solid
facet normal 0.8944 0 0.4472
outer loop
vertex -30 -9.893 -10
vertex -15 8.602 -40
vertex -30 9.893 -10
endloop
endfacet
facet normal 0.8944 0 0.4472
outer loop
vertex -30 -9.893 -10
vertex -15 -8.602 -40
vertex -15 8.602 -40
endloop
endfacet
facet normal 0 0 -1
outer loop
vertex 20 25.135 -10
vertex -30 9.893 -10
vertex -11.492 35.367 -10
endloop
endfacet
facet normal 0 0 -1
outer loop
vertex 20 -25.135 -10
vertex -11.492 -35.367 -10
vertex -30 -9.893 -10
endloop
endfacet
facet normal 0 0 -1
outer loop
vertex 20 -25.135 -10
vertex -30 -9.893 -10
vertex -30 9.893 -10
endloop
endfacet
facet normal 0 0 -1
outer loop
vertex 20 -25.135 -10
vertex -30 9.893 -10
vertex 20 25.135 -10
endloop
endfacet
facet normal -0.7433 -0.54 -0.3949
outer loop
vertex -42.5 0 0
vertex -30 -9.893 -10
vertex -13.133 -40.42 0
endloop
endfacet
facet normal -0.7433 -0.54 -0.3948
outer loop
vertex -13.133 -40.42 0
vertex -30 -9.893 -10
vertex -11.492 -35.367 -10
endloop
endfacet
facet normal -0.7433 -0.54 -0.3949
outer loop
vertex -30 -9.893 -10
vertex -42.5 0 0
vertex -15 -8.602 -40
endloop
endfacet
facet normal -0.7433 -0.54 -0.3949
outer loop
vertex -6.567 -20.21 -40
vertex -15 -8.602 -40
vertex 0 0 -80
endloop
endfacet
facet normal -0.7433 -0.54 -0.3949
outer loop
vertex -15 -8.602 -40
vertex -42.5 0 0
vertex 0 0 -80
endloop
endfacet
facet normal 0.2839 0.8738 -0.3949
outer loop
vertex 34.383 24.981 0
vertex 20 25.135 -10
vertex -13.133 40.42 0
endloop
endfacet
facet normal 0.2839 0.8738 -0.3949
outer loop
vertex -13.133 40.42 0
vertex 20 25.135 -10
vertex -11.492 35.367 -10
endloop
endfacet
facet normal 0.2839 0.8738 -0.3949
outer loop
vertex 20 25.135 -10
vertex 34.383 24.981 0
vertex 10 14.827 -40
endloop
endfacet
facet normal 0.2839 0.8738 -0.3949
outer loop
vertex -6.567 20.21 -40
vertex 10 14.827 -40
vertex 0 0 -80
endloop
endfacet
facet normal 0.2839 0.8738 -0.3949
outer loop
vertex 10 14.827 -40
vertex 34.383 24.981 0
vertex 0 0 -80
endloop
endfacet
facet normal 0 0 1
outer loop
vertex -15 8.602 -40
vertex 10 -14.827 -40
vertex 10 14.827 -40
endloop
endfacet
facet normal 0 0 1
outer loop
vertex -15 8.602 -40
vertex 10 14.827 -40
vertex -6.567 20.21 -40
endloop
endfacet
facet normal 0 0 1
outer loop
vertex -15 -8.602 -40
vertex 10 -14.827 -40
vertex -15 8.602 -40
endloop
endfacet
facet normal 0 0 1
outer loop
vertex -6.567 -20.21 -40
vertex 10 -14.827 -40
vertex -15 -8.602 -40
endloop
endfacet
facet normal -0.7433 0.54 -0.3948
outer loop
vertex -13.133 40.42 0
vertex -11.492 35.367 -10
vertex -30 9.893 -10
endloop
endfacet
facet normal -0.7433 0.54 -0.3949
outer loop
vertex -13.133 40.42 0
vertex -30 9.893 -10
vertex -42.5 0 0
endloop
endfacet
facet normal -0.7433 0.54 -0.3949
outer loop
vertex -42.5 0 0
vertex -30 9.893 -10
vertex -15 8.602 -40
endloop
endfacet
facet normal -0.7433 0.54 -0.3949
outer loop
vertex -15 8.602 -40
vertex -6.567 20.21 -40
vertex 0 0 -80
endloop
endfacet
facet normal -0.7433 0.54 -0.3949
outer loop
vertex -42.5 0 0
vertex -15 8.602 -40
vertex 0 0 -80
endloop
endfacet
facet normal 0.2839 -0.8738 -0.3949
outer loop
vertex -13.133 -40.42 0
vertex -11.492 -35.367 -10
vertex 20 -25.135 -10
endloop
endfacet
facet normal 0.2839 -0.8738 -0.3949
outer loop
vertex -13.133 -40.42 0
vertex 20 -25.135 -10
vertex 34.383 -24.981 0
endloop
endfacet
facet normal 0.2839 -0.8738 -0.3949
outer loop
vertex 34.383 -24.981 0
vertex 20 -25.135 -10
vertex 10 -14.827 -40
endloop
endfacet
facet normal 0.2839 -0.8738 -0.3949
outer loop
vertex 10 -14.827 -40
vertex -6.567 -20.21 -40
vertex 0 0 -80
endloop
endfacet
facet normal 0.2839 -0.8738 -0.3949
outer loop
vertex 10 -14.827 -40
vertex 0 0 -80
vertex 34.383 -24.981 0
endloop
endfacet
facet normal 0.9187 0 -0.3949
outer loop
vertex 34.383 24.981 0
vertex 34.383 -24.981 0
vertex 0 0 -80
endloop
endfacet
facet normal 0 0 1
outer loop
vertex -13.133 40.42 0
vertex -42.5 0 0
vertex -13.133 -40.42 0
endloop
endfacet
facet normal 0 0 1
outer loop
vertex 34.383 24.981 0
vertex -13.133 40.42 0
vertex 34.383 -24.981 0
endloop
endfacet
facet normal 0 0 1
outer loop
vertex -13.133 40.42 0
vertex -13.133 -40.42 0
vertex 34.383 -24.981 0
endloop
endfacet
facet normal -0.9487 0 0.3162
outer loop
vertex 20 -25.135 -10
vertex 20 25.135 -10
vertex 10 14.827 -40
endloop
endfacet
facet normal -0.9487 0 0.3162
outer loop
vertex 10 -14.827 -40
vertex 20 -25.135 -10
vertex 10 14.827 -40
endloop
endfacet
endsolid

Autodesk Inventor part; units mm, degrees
ref_plane "YZ Plane" through (0, 0, 0) normal (1, 0, 0) x (0, 1, 0)
ref_plane "XZ Plane" through (0, 0, 0) normal (0, 1, 0) x (-1, 0, 0)
sketch "Эскиз1" plane through (0, 0, 0) normal (0, 0, 1) x (1, 0, 0)
  line L0 (-42.5, 0) -> (-13.1332, 40.4199)
  line L1 (-13.1332, 40.4199) -> (34.3832, 24.9809)
  line L2 (34.3832, 24.9809) -> (34.3832, -24.9809)
  line L3 (34.3832, -24.9809) -> (-13.1332, -40.4199)
  line L4 (-13.1332, -40.4199) -> (-42.5, 0)
  point P0 (0, 0)
  point P1 (0, 0)
sketch "Эскиз2" plane through (0, 0, 0) normal (0, 1, 0) x (-1, 0, 0)
  line L0 (30, -10) -> (-20, -10)
  line L1 (-20, -10) -> (-10, -40)
  line L2 (-10, -40) -> (15, -40)
  line L3 (15, -40) -> (30, -10)
  line L4 (13.1332, 0) -> (-34.3832, 0) projected
  line L5 (42.5, 0) -> (13.1332, 0) projected
  point P0 (0, 0)
  dimension "d1" = 10
  dimension "d2" = 30
  dimension "d3" = 10
  dimension "d4" = 20
  dimension "d5" = 50
  dimension "d6" = 25
ref_plane "РабПлоскость1" through (0, 0, -80) normal (0, 0, 1) x (1, 0, 0)
sketch "Эскиз3" plane through (0, 0, -80) normal (0, 0, 1) x (1, 0, 0)
  point P0 (0, 0)
  point P1 (0, 0)
  point P2 (0, 0)
loft "Лофт1" add profiles "Эскиз1" section 2 point at (0, 0, -80)
extrude "Выдавливание1" cut sketch "Эскиз2" along normal through all both and the other way through all
properties part number "Шар"
